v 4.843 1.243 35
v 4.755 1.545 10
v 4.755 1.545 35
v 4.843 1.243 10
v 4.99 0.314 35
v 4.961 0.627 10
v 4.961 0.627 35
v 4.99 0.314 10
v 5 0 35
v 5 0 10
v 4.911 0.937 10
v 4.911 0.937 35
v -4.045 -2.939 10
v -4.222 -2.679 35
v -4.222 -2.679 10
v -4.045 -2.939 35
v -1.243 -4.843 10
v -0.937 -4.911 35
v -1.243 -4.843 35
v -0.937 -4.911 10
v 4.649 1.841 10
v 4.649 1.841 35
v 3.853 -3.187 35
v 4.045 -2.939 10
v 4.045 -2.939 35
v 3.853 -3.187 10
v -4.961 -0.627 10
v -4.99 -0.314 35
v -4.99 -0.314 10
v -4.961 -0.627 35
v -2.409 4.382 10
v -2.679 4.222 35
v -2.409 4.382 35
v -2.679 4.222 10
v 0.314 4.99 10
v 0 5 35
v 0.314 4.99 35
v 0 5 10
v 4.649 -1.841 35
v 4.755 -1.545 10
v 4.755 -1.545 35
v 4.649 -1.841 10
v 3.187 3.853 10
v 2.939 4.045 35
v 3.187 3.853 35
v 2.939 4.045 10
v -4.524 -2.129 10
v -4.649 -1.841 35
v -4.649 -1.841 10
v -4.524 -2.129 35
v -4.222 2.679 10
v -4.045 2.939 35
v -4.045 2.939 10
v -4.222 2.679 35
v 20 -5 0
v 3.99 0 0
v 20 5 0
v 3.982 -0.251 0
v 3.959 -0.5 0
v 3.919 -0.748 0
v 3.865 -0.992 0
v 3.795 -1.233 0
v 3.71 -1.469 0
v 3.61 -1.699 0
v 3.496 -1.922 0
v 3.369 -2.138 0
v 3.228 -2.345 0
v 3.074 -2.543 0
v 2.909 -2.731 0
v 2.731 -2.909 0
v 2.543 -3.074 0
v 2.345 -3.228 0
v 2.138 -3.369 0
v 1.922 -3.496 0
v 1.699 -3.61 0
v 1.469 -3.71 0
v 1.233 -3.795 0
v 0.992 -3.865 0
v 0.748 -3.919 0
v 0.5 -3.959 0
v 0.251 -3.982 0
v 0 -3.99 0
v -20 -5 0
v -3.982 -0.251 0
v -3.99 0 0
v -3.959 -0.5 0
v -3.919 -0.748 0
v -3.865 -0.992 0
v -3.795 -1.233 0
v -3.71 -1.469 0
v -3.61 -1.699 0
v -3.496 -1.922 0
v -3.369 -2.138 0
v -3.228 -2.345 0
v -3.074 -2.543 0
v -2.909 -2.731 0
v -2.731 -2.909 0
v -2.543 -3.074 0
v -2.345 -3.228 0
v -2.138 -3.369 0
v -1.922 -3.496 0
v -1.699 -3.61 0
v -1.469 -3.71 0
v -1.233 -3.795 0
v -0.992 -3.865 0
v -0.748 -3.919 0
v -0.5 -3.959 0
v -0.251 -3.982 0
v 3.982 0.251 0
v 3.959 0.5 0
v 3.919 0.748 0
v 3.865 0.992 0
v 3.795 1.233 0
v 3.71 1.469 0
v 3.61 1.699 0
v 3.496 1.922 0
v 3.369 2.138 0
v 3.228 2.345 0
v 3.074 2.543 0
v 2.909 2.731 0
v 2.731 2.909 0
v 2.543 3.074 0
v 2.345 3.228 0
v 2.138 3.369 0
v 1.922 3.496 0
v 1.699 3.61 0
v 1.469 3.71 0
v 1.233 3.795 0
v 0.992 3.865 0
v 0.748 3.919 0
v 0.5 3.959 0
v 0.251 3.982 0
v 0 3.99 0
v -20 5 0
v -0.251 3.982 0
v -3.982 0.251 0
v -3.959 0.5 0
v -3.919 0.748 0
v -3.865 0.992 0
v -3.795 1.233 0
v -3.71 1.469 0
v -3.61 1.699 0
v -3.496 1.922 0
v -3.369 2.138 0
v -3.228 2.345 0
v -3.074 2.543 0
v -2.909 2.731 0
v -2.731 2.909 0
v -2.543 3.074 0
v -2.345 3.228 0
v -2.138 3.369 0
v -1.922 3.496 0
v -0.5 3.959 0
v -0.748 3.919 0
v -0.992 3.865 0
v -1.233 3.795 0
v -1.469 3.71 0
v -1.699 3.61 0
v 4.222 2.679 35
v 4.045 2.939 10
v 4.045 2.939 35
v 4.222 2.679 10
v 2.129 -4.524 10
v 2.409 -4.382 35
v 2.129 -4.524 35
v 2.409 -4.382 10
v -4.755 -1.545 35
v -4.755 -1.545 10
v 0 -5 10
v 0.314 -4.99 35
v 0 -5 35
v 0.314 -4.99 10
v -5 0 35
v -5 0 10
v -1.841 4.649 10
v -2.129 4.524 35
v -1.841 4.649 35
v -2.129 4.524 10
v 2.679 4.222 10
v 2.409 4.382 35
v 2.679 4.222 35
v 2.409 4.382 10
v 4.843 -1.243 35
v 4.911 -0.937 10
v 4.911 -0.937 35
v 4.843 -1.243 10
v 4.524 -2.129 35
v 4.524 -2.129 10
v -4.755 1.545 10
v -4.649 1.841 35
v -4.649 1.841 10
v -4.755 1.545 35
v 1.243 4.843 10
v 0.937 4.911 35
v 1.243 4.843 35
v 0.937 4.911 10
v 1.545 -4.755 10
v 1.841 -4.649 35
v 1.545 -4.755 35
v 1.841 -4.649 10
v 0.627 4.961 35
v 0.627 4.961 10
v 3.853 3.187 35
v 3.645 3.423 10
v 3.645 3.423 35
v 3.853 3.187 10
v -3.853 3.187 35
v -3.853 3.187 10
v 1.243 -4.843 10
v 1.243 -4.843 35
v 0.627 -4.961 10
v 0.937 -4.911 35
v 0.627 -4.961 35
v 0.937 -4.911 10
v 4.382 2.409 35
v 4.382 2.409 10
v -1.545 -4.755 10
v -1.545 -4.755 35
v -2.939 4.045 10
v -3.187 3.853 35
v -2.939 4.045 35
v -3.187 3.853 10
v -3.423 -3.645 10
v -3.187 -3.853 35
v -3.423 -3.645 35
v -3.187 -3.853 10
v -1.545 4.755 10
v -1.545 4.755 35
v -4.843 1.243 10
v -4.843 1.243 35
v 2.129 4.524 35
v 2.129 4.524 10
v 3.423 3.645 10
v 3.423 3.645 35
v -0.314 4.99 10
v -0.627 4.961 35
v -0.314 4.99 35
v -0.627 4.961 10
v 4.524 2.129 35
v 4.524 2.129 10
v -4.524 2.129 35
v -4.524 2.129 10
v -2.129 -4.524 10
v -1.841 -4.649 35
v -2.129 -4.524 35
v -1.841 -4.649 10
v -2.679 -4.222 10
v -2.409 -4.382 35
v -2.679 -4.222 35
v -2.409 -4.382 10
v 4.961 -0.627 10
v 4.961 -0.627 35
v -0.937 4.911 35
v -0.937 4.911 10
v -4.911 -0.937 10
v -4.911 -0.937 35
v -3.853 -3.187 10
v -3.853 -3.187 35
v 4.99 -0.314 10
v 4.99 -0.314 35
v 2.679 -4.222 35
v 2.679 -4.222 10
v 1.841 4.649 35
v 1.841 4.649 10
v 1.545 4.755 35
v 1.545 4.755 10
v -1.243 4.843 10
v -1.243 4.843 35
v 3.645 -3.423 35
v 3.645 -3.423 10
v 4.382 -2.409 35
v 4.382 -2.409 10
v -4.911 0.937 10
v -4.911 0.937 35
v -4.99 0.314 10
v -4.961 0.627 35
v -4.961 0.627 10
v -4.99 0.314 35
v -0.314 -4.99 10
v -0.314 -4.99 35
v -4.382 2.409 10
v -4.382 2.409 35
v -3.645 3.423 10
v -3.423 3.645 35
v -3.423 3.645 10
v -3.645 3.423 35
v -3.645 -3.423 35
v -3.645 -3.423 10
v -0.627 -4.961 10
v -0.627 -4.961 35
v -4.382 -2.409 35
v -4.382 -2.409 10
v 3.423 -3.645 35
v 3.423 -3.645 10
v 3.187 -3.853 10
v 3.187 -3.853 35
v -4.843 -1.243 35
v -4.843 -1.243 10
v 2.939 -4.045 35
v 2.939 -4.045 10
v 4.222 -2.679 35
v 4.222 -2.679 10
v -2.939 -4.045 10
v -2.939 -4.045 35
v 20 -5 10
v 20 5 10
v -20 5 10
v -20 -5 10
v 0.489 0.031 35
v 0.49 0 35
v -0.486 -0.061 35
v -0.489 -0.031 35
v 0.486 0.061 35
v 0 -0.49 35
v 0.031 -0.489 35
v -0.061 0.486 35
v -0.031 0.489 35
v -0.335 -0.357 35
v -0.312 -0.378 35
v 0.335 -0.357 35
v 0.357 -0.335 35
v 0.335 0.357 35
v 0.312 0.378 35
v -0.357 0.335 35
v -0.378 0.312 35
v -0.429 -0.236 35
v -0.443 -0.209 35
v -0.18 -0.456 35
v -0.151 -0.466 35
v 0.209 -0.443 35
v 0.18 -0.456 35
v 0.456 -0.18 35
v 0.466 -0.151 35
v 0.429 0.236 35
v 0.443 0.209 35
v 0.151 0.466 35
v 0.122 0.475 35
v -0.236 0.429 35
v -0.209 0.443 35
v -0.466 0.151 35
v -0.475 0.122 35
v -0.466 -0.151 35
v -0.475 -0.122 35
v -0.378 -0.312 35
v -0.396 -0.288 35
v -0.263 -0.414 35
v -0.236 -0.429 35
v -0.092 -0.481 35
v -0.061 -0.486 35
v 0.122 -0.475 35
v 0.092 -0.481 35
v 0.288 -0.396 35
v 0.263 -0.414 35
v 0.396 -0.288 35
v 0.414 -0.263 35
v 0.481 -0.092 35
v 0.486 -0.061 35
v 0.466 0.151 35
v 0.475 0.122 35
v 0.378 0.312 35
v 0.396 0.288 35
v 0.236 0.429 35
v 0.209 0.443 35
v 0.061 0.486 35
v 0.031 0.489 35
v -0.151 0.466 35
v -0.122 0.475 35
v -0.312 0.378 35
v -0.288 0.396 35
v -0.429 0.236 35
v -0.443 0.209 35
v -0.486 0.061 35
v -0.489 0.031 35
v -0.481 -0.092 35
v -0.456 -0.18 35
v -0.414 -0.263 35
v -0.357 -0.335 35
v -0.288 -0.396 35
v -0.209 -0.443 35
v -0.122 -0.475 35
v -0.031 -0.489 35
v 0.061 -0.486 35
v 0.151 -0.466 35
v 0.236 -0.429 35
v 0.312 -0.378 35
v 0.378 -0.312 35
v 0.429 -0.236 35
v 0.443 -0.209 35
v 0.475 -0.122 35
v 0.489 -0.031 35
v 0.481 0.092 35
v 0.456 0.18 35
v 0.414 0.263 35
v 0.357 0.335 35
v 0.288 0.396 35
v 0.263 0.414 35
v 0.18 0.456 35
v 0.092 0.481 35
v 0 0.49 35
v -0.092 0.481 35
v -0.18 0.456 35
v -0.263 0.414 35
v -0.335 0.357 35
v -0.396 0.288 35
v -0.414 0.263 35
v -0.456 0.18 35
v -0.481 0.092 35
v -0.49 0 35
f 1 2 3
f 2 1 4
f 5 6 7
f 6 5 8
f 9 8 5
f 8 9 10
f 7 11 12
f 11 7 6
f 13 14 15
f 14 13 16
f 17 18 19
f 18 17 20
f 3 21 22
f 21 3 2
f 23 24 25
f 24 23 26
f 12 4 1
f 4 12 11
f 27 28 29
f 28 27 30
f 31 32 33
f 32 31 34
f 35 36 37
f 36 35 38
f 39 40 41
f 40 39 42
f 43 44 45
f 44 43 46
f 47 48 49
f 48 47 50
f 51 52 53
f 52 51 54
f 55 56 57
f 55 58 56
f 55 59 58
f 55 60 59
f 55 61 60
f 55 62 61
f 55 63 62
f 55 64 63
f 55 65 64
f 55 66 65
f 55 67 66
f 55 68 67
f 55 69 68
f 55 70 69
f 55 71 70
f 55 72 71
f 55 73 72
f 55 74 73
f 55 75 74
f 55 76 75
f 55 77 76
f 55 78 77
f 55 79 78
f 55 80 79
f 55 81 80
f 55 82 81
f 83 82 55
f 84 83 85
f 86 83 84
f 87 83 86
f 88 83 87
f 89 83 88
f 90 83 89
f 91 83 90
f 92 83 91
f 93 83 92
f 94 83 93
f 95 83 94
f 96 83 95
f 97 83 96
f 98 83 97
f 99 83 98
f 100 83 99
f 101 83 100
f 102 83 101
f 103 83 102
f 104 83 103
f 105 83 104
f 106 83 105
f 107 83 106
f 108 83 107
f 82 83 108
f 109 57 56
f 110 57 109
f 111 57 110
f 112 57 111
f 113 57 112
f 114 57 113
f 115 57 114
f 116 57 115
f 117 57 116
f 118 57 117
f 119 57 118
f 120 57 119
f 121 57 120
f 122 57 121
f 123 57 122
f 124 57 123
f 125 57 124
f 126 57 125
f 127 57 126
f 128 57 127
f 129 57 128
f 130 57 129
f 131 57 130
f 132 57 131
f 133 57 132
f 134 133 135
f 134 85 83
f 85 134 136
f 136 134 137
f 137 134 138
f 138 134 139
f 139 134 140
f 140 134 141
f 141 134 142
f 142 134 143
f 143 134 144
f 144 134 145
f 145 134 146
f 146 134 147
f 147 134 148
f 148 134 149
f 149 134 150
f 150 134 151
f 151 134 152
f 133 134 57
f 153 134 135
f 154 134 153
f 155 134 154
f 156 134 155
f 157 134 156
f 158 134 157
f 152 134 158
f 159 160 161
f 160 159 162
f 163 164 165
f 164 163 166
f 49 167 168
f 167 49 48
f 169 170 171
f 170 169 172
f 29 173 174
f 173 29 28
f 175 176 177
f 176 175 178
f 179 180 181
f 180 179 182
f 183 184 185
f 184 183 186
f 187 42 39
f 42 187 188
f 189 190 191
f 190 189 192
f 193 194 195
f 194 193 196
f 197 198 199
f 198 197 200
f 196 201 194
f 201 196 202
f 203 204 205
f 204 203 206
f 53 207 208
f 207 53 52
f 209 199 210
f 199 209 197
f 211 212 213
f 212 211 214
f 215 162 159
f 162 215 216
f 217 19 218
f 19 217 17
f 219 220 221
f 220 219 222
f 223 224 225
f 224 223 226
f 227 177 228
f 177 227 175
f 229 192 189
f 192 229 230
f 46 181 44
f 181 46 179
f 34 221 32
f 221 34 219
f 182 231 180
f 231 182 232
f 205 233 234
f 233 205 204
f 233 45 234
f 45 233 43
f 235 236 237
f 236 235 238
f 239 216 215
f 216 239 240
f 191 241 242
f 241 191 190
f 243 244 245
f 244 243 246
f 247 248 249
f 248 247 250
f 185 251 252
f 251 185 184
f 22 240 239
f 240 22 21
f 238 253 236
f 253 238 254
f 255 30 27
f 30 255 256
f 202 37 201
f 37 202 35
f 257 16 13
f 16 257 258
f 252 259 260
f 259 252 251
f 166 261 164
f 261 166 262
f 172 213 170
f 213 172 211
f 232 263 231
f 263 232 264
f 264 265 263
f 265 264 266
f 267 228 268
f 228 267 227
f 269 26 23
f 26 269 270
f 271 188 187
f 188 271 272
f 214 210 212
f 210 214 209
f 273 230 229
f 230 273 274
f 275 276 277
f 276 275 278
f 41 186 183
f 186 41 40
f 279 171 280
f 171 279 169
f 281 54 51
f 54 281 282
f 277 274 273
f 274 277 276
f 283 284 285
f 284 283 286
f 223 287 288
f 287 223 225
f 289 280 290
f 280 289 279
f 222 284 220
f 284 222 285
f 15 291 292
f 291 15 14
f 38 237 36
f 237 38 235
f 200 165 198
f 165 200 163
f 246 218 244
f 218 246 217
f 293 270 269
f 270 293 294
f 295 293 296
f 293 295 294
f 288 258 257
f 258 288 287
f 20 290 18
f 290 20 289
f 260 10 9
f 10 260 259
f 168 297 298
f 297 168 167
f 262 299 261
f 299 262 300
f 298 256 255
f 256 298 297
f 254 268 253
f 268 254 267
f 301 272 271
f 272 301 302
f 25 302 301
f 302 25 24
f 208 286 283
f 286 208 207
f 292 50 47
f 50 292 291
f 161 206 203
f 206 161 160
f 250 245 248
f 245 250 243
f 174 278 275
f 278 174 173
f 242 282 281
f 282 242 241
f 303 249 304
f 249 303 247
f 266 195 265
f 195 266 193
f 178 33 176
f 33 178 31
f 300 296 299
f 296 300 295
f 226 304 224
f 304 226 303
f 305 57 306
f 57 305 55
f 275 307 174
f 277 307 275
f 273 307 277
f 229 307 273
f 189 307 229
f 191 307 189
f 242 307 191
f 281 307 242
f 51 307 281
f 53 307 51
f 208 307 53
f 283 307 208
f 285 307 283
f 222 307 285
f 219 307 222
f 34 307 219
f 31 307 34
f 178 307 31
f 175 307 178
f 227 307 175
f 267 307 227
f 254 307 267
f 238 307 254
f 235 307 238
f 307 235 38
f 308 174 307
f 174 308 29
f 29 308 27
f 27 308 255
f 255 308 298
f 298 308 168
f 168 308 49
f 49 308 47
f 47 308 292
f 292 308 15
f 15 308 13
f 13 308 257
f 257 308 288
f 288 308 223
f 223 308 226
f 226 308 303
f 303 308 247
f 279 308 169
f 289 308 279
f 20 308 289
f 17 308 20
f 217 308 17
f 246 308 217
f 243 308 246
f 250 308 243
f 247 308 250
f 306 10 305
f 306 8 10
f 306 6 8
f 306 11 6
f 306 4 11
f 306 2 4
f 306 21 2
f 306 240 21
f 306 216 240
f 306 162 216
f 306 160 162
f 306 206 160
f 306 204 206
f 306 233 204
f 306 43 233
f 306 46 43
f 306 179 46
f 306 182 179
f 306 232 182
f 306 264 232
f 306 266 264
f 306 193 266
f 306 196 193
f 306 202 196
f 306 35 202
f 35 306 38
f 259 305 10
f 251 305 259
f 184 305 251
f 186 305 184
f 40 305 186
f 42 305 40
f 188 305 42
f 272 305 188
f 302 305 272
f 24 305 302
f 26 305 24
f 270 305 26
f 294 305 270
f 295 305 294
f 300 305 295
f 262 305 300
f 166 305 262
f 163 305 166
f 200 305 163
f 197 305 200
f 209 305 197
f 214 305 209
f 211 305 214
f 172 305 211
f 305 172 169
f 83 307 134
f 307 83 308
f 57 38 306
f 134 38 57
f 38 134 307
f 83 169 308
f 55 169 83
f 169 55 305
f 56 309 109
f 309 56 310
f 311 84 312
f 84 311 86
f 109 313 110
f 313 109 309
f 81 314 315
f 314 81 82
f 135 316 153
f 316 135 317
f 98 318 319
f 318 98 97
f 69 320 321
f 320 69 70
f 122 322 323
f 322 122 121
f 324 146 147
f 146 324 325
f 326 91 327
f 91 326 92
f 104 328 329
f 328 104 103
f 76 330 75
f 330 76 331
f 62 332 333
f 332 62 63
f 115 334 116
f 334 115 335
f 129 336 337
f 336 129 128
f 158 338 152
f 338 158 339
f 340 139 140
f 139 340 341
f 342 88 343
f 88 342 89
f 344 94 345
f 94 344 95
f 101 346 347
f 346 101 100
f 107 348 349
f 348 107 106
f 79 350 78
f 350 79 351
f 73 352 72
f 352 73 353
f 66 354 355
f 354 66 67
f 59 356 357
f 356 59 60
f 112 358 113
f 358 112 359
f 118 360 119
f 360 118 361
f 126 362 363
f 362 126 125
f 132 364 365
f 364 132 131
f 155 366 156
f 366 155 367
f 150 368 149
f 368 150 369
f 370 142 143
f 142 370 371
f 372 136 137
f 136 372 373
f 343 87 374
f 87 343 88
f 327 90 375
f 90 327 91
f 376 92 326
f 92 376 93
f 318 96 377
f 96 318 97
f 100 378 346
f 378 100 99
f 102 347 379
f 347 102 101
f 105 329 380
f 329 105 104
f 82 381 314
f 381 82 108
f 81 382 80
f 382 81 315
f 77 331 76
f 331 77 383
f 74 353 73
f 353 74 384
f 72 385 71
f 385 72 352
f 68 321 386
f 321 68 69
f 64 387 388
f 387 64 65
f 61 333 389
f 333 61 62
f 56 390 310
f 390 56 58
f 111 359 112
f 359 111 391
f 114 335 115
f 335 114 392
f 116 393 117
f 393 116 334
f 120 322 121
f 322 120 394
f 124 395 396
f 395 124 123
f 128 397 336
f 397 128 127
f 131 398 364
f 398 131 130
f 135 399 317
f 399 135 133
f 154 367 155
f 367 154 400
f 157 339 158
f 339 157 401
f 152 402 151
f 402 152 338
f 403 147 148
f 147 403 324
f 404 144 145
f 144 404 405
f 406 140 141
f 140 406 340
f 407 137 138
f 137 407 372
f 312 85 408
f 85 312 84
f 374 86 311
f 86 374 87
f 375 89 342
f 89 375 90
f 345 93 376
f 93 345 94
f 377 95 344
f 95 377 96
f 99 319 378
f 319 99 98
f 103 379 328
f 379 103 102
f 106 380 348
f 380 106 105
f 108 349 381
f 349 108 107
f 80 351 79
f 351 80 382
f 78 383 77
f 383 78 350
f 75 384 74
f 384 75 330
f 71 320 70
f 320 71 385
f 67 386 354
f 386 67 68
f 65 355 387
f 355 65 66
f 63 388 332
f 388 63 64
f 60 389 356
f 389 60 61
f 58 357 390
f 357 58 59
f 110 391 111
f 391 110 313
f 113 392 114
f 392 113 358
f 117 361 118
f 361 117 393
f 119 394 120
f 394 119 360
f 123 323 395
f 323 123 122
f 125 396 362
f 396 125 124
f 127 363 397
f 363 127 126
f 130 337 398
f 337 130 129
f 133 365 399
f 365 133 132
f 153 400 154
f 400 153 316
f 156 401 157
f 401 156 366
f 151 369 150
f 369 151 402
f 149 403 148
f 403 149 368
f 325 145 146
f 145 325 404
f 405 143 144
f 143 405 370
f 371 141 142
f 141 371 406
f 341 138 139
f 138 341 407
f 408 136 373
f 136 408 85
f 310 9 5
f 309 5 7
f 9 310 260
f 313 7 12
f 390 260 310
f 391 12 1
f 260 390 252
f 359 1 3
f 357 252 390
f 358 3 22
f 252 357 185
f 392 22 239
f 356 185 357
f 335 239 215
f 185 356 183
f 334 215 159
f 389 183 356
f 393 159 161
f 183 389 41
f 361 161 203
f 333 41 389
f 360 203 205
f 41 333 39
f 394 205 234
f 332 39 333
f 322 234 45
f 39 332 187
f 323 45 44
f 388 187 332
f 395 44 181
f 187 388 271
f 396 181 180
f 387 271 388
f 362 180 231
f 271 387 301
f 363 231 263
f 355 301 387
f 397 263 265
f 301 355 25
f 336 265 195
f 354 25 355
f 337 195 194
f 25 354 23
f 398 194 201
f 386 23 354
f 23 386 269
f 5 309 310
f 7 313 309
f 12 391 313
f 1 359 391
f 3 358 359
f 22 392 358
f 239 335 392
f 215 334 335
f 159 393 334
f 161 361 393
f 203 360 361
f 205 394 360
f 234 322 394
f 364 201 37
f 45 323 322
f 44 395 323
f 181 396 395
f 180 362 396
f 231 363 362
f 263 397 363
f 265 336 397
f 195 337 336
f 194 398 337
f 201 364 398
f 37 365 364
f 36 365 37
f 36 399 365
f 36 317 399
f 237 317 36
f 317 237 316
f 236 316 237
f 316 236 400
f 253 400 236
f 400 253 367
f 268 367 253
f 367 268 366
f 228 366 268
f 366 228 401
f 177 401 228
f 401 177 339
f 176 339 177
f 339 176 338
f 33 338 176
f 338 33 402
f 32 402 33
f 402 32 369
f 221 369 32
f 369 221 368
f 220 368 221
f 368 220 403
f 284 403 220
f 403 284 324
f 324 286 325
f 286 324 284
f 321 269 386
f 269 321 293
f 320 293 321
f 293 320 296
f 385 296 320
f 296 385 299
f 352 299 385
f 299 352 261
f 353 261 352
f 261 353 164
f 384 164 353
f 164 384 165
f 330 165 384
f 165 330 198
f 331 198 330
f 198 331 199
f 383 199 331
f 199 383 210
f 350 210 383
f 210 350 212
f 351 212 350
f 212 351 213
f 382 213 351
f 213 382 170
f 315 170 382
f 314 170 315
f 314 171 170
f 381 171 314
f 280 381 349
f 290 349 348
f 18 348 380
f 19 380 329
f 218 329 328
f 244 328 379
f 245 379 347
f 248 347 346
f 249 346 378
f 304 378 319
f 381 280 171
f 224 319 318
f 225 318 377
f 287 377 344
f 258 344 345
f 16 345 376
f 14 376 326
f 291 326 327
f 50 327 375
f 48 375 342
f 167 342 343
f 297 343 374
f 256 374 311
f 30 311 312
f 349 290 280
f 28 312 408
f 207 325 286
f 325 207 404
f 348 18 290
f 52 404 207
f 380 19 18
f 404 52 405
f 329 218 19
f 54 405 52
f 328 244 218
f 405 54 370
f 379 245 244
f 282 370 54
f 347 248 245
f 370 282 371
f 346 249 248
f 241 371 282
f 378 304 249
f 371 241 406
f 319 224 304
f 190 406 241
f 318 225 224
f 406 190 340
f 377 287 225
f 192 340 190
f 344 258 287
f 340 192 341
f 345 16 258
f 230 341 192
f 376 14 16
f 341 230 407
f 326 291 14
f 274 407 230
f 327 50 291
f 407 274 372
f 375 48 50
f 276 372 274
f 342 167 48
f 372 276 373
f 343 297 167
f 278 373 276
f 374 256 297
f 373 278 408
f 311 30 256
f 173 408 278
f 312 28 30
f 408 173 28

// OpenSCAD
// THIS IS A WIRE GUIDER TO DIRECT THE PATH OF WIRE IN A SOLAR ASSEMBLER

innerDia = 8;
outerDia = 10;
length = 40; // length of cones, cylinders, etc
blockWidth = 40; // width of screw block
tipCut = 5; // how much of the tip of the cone to cut off
tipDia = outerDia/2; // 0.45;
tipSizeCompare = 1; // a block to visualize wire exit hole
tipEdgeCompare = 0.5; // a block to visualize thickness next to hole
screwDia = 3.5; // diameter of screwhole for pivoting
screwHeight = 50; // height of screws on turret stand
servoTray = 36; // z height of extra stuff to be a servo tray on stand

difference() {
	union() {
                cylinder(r1 = outerDia/2, r2 = tipDia, h = length, $fn = 100); // outer cone
		translate([ -0.5 * blockWidth, -0.5 * outerDia, 0 ]) color("red") cube(size = [blockWidth,outerDia,outerDia], center = false); // wide box
		}
	hull() { // this is the cone and cylinder that subtracts from the solid shape
			translate([ 0, 0, -0.1]) cylinder(r1 = innerDia/2, r2 = 0, h = length, $fn = 100);
			// translate([ 0, 0, -1 * length - 1 ]) cylinder(r = innerDia/2, h = length);
		}
	translate([ -10, -10, length - tipCut ]) cube(size = 20); // this cuts off the tip of the cone, making the exit hole
	// translate([ -0.5 * blockWidth - 1, 0, outerDia/2]) rotate(a=[0,90,0]) cylinder(r = screwDia/2, h = blockWidth + 2, $fn = 100); // screwhole
	}
// translate([ -0.5 * tipSizeCompare, 0, length - tipCut ]) cube(size = tipSizeCompare, center = false); // uncomment this only to compare it to the opening size
// translate([ -1 * tipSizeCompare, -0.5 * tipSizeCompare, length - tipCut ]) cube(size = tipEdgeCompare, center = false); // uncomment this only to compare it to wall thickness
/*
difference() {
        union() {
                translate([ -0.5 * blockWidth - 2*outerDia, outerDia, 0 ]) cube(size = [blockWidth + 4*outerDia,outerDia,outerDia], center = false); // extra wide box
                translate([ -0.5 * blockWidth, outerDia, 0 ]) cube(size = [blockWidth,outerDia,outerDia + servoTray], center = false); // servo tray sticks out
                translate([ -0.5 * blockWidth - outerDia, outerDia, 0 ]) cube(size = [outerDia,screwHeight + outerDia/2,outerDia], center = false); // stand leg
                translate([ 0.5 * blockWidth, outerDia, 0 ]) cube(size = [outerDia,screwHeight + outerDia/2,outerDia], center = false); // other stand leg
                }
        translate([0, screwHeight + outerDia, outerDia/2]) rotate(a=[0,90,0]) cylinder(r = screwDia/2, h = blockWidth + 2*outerDia + 1, center = true, $fn = 100);
        translate([0, 1.3*outerDia, 1.5*outerDia]) rotate(a=[0,90,0]) cylinder(r = screwDia/2, h = blockWidth + 2*outerDia + 1, center = true, $fn = 100); // ziptie hole
        translate([0, 1.3*outerDia, 3.5*outerDia]) rotate(a=[0,90,0]) cylinder(r = screwDia/2, h = blockWidth + 2*outerDia + 1, center = true, $fn = 100); // ziptie hole
        }
*/
